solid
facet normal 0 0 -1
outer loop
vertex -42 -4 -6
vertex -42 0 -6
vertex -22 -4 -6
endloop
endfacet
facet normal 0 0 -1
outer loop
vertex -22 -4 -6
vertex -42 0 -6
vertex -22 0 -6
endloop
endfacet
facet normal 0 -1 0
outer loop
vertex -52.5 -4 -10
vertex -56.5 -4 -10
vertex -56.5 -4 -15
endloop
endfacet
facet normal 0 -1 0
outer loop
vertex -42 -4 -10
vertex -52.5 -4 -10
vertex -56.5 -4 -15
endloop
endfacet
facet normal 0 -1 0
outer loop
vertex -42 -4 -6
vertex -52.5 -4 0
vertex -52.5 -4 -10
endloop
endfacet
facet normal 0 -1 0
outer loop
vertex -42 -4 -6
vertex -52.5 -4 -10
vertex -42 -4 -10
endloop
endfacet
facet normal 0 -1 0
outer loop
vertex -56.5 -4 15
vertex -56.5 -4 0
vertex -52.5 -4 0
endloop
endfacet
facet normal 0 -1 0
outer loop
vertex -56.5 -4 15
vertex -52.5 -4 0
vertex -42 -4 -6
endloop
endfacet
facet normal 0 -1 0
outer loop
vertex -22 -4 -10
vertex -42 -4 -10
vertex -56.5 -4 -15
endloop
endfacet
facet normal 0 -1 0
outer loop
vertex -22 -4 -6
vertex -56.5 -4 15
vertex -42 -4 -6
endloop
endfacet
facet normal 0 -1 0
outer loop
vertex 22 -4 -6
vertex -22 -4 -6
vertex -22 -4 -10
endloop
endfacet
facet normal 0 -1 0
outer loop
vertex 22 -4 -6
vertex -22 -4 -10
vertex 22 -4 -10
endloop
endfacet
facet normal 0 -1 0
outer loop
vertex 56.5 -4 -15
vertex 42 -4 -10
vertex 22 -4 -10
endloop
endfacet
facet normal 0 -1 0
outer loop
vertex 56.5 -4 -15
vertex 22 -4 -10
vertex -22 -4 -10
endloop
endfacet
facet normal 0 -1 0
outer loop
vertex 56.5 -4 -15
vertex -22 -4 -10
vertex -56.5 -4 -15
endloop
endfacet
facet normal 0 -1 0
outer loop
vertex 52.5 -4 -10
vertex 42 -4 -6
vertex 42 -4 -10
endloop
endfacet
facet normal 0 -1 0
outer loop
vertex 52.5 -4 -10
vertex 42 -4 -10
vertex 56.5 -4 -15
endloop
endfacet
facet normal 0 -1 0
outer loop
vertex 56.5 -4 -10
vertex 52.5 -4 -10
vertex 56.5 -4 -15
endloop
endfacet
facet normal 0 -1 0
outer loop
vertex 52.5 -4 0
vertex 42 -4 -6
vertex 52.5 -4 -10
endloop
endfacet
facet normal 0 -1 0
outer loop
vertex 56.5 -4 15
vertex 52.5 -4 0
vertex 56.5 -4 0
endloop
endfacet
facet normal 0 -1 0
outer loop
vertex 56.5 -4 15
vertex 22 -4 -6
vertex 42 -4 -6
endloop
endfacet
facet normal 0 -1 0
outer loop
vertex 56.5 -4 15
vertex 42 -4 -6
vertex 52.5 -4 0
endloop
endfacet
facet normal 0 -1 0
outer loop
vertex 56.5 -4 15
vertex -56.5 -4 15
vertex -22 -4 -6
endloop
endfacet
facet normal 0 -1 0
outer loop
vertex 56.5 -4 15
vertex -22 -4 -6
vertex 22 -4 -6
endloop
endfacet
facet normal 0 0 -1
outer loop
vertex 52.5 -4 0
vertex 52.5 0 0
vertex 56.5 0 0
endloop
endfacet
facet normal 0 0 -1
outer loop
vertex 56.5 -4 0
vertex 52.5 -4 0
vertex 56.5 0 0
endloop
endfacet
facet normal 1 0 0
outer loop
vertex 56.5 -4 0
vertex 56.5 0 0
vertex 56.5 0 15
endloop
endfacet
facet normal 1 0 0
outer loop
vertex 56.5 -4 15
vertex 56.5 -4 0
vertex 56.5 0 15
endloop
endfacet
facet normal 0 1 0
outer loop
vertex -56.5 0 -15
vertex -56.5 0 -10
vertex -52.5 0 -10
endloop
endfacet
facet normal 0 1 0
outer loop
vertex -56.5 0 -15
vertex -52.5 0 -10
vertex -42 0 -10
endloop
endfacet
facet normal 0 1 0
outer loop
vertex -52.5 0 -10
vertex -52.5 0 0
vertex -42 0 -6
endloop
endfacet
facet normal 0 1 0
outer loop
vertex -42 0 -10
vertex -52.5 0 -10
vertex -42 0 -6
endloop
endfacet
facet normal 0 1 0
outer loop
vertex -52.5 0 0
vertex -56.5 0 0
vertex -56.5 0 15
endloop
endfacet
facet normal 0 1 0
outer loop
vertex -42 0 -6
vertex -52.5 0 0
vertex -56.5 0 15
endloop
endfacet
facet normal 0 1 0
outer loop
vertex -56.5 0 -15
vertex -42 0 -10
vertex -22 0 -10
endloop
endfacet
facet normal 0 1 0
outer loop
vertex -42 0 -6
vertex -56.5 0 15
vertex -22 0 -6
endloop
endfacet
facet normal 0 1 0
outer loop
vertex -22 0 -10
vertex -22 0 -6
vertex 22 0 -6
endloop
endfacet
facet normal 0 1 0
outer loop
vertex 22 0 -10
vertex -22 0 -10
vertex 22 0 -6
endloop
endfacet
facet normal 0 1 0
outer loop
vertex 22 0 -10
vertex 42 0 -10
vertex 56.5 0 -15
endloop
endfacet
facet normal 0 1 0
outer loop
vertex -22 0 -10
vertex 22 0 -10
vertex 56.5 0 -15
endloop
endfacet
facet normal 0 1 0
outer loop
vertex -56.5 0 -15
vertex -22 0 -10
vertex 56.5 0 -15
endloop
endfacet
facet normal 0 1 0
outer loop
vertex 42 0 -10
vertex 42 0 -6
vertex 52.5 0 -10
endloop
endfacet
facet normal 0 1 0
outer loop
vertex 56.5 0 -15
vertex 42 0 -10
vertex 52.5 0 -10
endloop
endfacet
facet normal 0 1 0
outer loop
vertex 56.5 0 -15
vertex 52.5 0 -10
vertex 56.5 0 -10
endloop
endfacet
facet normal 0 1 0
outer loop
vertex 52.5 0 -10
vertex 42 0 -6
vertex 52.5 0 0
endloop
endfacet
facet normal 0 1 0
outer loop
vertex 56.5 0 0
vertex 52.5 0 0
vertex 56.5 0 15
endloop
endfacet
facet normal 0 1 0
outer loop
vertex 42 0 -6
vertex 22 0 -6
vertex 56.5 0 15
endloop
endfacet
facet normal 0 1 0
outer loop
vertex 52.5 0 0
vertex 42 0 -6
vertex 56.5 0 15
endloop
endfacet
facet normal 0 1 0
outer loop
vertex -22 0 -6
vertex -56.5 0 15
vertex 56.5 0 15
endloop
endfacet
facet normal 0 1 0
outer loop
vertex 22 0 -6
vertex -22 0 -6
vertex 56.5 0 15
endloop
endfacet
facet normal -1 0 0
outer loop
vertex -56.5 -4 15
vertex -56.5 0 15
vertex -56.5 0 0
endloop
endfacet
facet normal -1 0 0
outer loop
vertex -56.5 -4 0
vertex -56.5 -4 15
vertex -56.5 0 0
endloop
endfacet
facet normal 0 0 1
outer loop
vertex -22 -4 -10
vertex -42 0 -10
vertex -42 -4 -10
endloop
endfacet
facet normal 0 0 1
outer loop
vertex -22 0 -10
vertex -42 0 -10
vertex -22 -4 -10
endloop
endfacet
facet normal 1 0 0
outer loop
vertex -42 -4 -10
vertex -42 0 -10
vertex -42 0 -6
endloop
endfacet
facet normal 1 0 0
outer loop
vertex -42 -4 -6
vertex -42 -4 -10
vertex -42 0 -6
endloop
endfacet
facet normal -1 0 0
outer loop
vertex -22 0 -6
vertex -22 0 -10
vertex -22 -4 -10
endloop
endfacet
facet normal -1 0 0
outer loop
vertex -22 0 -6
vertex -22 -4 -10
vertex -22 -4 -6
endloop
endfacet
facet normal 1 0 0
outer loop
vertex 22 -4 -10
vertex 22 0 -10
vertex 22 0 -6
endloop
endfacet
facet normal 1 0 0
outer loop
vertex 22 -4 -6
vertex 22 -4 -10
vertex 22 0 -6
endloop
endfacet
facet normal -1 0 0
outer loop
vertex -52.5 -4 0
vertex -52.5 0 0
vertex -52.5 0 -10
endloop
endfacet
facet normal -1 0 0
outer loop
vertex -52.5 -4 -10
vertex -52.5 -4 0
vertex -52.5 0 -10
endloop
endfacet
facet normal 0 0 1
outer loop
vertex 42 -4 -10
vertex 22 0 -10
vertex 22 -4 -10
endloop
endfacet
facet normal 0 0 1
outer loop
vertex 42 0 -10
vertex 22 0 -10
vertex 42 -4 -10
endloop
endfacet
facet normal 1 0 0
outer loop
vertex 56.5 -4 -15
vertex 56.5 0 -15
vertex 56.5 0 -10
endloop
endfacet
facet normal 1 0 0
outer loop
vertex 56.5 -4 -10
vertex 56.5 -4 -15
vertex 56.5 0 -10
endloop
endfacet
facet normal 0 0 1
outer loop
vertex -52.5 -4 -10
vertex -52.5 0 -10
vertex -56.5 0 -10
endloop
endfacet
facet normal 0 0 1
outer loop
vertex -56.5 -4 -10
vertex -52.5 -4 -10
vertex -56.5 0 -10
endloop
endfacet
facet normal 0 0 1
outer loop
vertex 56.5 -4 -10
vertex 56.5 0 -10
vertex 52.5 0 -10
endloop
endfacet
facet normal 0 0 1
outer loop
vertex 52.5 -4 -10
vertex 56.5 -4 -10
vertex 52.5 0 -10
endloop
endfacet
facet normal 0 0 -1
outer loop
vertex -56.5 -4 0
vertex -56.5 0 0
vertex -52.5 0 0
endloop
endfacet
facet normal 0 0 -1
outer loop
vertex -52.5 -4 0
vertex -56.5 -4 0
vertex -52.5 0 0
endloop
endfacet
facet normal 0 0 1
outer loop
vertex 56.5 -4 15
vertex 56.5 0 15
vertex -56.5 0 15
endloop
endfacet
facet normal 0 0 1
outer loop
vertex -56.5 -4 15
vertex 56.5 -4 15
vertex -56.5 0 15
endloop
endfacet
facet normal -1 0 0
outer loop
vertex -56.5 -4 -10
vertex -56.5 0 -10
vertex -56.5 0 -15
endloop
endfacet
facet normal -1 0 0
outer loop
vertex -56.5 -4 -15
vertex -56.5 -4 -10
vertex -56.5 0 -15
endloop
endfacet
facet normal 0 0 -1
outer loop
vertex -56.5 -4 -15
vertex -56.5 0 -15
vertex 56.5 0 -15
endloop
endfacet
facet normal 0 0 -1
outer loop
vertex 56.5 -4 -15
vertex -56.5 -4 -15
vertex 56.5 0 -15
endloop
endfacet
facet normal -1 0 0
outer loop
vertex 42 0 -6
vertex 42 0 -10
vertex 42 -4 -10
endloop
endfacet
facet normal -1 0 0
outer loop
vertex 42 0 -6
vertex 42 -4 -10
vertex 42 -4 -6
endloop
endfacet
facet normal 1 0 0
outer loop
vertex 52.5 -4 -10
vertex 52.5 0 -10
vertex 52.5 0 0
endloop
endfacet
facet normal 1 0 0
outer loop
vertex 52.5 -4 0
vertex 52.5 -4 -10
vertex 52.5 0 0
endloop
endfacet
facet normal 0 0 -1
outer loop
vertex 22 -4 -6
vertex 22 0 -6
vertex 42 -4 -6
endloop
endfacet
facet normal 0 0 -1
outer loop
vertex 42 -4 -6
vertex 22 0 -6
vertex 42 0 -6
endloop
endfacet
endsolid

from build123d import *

# Parameters (mm, degrees)
F0_W     = 20
F0_H     = 4
F1_DEPTH = 4


with BuildPart() as f1:
    # F0 (on Front) → F1 (new body)
    with BuildSketch(Plane.XZ):
        Polygon((56.5, 0), (56.5, 15), (-56.5, 15), (-56.5, 0), (-52.5, 0), (-52.5, -10), (-56.5, -10), (-56.5, -15), (56.5, -15), (56.5, -10), (52.5, -10), (52.5, 0), align=None)
        with Locations((-32, -8)):
            Rectangle(F0_W, F0_H, mode=Mode.SUBTRACT)
        with Locations((32, -8)):
            Rectangle(F0_W, F0_H, mode=Mode.SUBTRACT)
    extrude(amount=F1_DEPTH)


solid = f1.part
